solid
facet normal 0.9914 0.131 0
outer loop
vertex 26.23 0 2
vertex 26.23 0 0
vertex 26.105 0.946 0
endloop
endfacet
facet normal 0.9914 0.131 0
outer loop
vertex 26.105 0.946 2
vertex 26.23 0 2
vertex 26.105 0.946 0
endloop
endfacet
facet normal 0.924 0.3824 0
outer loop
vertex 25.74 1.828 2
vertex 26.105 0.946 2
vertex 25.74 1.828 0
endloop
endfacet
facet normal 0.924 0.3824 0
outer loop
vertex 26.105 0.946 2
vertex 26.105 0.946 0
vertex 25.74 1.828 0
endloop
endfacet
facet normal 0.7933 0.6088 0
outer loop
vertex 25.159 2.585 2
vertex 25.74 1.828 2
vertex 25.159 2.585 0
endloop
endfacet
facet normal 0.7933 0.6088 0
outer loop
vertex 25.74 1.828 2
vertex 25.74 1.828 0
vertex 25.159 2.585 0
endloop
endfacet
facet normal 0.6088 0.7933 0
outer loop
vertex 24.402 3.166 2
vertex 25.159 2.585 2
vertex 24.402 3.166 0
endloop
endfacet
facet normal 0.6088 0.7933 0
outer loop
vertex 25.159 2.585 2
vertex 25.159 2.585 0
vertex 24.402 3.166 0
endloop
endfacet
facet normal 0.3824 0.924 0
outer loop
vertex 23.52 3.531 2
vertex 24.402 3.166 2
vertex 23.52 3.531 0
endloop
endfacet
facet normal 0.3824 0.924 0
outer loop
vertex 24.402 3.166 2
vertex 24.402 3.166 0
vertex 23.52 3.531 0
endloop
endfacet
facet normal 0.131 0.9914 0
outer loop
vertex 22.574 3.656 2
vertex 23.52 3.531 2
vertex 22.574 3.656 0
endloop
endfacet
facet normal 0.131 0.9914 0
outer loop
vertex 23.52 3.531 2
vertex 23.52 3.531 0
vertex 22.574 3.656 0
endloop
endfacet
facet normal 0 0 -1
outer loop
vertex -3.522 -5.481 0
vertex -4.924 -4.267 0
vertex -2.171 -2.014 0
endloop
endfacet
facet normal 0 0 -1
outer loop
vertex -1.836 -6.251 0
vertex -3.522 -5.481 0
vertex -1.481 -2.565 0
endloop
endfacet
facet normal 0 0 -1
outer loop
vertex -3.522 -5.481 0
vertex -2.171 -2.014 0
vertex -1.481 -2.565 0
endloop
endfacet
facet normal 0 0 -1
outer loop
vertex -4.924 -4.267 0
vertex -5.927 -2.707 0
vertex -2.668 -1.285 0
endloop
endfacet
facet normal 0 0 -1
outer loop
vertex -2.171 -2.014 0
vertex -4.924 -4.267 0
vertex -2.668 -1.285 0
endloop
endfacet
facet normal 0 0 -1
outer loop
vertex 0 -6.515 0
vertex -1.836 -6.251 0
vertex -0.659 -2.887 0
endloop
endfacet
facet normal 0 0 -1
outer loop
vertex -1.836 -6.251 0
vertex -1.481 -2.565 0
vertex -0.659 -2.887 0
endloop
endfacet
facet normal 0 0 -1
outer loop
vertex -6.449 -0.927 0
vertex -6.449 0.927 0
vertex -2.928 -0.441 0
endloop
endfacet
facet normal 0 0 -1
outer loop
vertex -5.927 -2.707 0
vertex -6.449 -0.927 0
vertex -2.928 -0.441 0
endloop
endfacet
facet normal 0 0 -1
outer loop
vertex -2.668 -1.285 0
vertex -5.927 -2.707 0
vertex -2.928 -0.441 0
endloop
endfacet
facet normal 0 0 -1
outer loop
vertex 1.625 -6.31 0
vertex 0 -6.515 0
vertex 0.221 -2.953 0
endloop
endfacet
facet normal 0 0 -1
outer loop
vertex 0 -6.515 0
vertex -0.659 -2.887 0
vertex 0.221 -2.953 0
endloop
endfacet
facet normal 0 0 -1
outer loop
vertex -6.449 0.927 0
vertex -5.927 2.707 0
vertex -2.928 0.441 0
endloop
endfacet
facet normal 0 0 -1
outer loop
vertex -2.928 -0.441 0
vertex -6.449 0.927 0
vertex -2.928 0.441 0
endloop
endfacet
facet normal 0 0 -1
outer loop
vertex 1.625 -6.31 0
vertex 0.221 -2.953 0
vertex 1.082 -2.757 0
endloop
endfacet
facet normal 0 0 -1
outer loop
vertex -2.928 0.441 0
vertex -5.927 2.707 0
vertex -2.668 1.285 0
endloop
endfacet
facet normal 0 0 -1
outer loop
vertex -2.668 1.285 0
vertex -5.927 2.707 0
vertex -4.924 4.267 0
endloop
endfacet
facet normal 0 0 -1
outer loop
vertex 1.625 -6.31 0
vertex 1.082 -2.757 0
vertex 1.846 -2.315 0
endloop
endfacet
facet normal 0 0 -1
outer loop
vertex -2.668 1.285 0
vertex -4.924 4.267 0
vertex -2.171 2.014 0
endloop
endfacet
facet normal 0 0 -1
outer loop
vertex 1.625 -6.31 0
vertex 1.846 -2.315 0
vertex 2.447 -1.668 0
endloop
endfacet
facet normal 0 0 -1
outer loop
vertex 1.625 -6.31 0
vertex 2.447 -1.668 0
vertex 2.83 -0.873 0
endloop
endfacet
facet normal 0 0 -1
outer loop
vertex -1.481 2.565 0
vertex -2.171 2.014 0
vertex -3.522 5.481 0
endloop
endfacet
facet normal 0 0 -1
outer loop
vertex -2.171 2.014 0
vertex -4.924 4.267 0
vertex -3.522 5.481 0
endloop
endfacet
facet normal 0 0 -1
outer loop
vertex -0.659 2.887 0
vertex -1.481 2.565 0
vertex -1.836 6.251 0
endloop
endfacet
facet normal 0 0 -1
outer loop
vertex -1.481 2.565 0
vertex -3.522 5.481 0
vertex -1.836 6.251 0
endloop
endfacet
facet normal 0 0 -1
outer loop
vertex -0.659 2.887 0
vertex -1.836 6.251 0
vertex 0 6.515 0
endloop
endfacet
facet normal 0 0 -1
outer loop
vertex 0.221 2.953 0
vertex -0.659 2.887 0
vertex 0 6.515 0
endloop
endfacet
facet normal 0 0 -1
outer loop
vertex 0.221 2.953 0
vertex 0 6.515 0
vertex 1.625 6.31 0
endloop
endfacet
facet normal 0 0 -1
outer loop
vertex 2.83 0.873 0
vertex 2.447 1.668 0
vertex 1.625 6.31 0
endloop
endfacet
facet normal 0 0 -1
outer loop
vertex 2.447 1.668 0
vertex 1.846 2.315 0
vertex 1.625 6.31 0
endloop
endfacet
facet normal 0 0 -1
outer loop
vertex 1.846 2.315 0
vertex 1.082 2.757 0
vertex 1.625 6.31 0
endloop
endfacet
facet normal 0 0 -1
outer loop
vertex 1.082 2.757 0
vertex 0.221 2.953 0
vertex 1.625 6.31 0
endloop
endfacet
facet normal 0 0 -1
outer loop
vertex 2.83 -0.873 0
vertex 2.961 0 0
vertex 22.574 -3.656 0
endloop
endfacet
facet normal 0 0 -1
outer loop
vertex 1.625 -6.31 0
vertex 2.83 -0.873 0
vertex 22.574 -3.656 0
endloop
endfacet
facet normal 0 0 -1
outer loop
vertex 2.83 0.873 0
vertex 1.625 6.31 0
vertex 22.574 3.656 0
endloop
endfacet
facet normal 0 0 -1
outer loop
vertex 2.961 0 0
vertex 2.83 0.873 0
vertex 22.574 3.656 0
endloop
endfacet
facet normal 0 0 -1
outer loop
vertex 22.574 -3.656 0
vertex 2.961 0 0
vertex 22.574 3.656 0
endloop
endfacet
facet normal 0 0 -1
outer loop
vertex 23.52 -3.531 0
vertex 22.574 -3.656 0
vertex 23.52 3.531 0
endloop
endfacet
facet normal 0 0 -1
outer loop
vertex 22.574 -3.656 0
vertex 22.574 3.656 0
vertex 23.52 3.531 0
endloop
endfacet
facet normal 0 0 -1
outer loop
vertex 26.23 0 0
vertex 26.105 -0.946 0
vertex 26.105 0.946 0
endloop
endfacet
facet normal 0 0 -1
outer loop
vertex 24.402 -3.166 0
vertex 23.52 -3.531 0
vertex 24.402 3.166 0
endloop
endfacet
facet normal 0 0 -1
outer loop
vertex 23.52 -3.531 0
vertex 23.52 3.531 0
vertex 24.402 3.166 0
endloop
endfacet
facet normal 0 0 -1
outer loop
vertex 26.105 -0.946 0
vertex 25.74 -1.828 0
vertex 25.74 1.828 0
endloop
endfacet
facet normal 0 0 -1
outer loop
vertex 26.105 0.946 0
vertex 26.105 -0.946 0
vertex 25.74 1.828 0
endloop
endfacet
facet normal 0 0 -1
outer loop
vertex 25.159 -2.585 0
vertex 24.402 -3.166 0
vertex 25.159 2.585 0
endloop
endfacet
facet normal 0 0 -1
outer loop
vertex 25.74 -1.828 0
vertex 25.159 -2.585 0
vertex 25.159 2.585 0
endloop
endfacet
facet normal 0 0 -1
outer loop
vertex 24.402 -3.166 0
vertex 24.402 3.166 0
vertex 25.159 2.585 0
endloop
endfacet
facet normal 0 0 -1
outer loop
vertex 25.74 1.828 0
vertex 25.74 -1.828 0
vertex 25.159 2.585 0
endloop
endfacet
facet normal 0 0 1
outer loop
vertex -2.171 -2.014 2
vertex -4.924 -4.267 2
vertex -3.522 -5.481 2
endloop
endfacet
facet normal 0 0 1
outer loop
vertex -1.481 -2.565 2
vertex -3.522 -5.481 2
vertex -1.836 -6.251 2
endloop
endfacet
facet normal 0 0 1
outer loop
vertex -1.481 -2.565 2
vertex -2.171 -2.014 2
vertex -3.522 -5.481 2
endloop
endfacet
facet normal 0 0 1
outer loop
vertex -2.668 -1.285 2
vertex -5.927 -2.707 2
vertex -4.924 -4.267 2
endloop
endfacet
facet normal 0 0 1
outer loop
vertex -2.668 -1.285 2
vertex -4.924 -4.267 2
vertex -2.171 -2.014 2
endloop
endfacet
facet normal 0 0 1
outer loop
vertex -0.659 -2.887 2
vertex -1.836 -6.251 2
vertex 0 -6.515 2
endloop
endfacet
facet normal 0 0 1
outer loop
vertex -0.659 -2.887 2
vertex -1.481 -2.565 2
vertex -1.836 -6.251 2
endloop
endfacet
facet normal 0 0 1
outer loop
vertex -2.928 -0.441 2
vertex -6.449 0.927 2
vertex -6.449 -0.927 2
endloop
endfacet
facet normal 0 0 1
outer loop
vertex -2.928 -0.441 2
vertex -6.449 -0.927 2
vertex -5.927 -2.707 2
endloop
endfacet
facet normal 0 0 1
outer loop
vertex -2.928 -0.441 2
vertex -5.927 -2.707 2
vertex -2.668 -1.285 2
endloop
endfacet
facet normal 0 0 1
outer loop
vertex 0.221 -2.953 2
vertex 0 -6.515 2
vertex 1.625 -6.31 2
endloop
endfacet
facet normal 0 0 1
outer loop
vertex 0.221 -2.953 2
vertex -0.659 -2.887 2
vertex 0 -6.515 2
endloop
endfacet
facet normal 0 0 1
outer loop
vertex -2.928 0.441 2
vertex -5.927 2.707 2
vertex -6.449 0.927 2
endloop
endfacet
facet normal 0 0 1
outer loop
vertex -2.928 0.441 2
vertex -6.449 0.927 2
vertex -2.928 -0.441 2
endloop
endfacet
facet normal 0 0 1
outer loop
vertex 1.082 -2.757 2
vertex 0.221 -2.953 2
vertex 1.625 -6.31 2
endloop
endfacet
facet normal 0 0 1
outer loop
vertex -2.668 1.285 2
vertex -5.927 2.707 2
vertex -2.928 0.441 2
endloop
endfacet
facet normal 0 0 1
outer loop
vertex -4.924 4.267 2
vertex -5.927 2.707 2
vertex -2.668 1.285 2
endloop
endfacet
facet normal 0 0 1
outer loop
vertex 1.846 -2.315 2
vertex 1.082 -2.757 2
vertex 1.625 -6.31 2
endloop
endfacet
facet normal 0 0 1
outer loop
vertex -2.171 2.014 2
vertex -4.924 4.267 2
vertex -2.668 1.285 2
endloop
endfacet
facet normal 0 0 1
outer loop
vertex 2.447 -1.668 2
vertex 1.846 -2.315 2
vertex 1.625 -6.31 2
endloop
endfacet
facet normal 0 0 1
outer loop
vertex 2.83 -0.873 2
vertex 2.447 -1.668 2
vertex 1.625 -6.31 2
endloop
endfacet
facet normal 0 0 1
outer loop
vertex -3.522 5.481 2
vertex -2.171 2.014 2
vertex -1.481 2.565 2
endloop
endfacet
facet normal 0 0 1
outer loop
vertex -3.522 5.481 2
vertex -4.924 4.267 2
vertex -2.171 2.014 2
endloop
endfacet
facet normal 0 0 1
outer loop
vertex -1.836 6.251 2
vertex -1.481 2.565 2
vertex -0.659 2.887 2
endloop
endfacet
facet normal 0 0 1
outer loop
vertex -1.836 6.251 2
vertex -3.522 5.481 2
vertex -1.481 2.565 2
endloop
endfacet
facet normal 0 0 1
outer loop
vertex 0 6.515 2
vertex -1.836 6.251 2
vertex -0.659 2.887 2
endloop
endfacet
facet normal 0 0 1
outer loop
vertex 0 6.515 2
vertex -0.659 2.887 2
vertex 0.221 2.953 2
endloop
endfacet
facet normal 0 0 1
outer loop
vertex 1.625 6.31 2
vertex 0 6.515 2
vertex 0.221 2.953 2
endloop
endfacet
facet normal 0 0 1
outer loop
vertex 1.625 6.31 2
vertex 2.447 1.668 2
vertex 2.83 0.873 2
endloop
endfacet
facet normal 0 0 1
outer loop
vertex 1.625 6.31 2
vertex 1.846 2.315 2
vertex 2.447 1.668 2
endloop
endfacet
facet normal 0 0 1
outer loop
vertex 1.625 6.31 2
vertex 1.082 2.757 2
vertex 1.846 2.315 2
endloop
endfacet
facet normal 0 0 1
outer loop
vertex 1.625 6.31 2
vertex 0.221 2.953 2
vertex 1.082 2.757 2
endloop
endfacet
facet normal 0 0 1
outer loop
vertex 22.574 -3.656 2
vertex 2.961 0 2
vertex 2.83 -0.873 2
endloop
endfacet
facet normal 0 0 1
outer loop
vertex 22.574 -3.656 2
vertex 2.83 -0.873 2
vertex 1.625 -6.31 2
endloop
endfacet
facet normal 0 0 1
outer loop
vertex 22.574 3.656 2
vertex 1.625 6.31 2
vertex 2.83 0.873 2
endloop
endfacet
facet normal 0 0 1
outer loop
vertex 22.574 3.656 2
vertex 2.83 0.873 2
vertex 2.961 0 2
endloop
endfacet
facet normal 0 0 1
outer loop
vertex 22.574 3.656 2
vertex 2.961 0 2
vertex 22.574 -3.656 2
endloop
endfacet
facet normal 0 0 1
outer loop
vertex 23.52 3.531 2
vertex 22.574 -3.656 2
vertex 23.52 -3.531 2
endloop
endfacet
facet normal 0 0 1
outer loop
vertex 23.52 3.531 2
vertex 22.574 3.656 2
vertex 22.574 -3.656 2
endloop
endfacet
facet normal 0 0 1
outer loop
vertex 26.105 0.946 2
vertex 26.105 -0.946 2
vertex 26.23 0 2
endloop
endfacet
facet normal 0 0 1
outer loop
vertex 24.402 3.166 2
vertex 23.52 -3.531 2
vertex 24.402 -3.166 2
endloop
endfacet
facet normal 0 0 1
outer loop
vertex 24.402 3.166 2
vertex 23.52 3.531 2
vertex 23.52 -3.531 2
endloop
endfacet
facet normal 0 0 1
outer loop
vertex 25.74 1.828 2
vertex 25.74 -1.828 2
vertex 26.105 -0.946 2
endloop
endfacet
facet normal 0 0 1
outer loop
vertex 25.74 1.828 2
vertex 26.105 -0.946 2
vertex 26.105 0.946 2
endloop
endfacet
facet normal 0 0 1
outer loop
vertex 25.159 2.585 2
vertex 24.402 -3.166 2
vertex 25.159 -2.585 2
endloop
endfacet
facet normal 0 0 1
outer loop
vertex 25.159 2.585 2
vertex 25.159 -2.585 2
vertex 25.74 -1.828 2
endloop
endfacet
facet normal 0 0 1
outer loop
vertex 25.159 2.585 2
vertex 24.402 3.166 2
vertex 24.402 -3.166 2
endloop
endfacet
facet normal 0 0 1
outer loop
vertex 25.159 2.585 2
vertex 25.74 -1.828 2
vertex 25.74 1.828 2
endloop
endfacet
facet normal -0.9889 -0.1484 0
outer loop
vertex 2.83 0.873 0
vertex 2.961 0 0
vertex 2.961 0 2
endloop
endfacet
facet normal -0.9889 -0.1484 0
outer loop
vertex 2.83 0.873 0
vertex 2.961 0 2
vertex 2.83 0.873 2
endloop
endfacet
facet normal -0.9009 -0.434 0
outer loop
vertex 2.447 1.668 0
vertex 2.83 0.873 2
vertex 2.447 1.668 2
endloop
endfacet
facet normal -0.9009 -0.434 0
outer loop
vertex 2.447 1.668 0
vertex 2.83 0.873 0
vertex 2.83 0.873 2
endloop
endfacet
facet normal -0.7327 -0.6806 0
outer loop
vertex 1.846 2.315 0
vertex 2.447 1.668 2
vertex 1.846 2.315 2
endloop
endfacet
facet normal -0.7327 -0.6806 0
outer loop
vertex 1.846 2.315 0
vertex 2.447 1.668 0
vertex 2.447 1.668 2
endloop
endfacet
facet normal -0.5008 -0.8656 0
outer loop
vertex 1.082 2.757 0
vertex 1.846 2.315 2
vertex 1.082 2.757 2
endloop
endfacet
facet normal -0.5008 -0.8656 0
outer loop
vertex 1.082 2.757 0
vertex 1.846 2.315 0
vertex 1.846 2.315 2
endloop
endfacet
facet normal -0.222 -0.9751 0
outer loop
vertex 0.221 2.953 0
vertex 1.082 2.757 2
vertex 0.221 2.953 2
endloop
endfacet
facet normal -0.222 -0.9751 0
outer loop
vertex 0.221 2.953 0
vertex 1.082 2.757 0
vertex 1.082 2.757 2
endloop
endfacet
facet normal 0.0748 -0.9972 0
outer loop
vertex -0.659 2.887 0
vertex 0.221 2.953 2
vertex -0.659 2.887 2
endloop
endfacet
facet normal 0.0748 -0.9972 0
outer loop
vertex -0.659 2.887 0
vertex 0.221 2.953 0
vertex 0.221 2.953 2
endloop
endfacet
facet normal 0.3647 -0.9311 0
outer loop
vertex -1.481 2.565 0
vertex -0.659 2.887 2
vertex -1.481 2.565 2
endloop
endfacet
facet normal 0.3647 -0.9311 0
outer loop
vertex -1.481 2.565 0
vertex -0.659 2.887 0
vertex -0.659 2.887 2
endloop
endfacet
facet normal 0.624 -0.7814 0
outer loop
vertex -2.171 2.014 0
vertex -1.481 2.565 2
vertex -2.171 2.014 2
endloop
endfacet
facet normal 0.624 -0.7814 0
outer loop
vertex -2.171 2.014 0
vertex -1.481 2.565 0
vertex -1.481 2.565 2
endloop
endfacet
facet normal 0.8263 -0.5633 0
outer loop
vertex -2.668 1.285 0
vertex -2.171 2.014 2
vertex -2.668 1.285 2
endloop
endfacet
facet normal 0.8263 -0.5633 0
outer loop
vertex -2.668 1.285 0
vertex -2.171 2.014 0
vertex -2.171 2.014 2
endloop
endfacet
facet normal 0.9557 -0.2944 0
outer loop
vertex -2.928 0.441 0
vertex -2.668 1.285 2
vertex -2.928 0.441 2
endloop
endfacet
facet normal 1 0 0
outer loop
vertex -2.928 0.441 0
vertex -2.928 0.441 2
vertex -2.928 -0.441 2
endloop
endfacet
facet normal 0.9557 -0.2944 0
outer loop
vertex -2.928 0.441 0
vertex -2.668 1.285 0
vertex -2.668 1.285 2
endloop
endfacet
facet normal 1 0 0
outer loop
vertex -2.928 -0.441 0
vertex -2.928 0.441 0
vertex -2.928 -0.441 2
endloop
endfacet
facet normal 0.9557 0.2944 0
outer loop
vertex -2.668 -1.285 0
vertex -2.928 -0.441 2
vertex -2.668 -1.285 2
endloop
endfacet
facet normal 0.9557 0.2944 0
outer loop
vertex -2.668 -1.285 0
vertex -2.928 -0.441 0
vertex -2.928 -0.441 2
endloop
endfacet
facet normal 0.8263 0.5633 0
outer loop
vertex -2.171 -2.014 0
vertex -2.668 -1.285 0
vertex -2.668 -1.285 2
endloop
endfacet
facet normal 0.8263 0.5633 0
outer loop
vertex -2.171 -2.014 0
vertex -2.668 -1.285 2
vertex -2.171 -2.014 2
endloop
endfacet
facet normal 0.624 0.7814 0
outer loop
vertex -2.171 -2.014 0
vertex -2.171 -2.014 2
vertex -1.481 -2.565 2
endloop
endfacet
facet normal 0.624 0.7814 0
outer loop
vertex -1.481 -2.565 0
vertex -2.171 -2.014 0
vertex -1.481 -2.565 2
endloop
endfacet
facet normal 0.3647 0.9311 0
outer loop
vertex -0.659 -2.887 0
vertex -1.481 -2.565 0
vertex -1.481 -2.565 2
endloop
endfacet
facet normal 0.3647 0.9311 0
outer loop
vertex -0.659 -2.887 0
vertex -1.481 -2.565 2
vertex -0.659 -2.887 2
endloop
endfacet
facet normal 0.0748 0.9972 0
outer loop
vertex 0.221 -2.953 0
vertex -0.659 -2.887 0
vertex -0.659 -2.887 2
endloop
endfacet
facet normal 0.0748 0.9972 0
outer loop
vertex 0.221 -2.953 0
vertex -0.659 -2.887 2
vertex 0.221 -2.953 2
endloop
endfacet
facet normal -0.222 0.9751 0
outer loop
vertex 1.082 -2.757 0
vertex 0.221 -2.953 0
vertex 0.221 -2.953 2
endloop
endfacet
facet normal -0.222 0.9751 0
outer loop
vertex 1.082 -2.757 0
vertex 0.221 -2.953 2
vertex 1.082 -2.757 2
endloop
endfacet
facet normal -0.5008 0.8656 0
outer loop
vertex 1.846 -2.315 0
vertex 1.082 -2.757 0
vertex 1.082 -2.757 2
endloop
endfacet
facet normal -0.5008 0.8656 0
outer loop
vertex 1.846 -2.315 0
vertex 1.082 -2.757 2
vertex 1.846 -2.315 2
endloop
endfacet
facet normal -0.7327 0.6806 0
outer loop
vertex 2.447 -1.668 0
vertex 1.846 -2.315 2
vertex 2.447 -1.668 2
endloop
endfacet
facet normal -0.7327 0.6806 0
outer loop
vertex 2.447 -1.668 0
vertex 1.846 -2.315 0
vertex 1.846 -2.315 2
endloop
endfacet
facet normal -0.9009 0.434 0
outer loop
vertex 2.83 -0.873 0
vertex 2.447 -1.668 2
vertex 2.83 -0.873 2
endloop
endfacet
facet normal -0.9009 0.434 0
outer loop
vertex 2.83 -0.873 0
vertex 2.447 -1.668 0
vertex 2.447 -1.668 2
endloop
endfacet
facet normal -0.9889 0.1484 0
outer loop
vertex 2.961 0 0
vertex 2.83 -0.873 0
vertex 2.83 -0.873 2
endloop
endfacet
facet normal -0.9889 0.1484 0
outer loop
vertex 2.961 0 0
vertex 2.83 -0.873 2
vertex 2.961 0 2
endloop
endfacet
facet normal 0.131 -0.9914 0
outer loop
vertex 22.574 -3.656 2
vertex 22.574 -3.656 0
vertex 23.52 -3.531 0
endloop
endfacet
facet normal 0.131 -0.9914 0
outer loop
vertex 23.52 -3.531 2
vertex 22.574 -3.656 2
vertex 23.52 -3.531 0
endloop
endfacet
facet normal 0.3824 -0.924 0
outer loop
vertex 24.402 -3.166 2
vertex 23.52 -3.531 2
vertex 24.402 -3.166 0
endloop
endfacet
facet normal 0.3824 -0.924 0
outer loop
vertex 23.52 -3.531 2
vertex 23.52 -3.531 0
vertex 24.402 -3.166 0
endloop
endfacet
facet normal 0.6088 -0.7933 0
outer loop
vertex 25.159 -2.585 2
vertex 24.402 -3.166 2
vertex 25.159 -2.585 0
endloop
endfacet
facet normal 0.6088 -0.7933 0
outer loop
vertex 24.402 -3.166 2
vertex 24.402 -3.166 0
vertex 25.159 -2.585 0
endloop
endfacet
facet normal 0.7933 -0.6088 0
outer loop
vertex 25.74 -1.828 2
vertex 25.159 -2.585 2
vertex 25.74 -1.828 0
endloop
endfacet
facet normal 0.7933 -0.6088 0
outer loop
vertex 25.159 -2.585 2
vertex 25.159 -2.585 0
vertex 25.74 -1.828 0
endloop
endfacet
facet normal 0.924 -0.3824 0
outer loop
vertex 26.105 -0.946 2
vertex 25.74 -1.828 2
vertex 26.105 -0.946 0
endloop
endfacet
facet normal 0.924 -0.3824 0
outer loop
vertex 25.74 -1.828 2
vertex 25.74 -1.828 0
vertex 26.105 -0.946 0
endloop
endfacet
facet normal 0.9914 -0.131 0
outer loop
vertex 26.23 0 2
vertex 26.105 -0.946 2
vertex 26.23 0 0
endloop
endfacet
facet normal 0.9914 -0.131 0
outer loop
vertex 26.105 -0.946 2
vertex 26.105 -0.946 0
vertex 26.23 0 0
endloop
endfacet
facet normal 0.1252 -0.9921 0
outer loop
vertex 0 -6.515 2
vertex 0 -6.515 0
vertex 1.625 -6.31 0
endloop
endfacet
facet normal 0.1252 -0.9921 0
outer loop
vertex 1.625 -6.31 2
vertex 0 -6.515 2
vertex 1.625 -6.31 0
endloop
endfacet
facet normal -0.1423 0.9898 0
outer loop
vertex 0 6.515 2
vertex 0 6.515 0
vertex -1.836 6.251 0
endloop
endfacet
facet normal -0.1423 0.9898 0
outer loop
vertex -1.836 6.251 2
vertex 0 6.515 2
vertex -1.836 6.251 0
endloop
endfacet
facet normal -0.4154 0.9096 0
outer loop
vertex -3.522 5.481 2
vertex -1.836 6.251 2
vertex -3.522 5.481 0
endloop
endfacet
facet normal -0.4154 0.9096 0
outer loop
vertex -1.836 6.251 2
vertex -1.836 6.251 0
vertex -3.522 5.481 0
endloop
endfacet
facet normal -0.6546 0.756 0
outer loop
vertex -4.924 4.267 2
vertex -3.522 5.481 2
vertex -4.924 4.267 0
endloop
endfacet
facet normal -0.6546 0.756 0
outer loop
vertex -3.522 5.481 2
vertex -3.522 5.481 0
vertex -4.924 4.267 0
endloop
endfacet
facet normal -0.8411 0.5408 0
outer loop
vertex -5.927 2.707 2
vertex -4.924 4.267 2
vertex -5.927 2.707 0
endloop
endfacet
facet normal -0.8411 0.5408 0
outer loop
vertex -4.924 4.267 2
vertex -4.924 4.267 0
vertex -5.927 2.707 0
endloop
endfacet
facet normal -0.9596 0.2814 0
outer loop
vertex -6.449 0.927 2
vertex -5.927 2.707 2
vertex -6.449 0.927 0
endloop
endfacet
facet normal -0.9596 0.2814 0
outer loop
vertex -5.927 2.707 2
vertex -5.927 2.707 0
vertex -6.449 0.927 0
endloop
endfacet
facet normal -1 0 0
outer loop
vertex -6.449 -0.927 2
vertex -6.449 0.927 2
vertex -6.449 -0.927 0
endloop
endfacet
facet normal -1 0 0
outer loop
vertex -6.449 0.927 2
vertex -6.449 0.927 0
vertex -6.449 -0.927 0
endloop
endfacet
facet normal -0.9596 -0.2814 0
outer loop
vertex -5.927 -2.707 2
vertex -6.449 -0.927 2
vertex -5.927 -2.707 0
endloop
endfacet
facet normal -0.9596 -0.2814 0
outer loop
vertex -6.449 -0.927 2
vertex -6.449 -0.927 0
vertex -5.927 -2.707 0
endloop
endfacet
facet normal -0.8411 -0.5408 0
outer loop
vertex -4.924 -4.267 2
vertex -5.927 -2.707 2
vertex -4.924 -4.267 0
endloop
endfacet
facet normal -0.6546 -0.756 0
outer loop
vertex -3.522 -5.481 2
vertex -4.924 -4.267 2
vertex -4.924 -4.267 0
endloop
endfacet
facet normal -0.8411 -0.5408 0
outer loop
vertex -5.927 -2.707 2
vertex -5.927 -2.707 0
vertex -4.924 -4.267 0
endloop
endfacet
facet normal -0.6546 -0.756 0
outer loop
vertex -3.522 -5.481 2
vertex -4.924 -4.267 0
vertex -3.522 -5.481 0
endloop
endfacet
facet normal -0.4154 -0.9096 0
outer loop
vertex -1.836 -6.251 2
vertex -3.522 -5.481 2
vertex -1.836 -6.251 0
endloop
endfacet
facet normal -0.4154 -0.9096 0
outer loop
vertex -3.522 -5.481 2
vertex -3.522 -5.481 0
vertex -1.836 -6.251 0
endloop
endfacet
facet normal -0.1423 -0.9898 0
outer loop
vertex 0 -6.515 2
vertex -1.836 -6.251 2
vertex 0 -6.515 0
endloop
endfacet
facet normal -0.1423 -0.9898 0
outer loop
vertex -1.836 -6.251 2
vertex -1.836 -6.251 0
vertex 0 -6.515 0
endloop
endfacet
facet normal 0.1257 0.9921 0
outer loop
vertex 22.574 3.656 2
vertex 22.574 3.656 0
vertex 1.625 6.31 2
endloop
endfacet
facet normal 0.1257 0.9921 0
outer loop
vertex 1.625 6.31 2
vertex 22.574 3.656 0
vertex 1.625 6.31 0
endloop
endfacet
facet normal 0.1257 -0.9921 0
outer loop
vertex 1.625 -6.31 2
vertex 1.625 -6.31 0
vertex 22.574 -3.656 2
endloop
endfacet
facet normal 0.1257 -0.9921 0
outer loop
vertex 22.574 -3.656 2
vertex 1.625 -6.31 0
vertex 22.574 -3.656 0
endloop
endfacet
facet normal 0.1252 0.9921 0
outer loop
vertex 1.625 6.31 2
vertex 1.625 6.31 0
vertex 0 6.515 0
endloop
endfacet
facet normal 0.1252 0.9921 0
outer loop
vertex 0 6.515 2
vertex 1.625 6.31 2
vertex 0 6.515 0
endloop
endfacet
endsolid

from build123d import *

# Parameters (mm, degrees)
F0_R     = 2.9612883312
F1_DEPTH = 2
F2_R     = 0.988841467
F3_DEPTH = 10


with BuildPart() as f1:
    # F0 (on Top) → F1 (new body)
    with BuildSketch(Plane.XY):
        with BuildLine():
            Line((1.6245851515, 6.3095047445), (0, 6.5152994586))
            ThreePointArc((0, 6.5152994586), (-6.5152994586, 0), (0, -6.5152994586))
            Line((0, -6.5152994586), (1.6245851515, -6.3095047445))
            ThreePointArc((1.6245851515, -6.3095047445), (5.1494555923, -3.9915202792), (6.5152994586, 0))
            ThreePointArc((6.5152994586, 0), (5.1494555923, 3.9915202792), (1.6245851515, 6.3095047445))
        make_face()
        Circle(F0_R, mode=Mode.SUBTRACT)
        with BuildLine():
            Line((22.574134171, 3.6557155928), (1.6245851515, 6.3095047445))
            ThreePointArc((1.6245851515, 6.3095047445), (5.1494555923, 3.9915202792), (6.5152994586, 0))
            ThreePointArc((6.5152994586, 0), (5.1494555923, -3.9915202792), (1.6245851515, -6.3095047445))
            Line((1.6245851515, -6.3095047445), (22.574134171, -3.6557155928))
            ThreePointArc((22.574134171, -3.6557155928), (18.9184185782, 0), (22.574134171, 3.6557155928))
        make_face()
        with BuildLine():
            ThreePointArc((26.2298497639, 0), (25.1591154568, 2.5849812858), (22.574134171, 3.6557155928))
            ThreePointArc((22.574134171, 3.6557155928), (18.9184185782, 0), (22.574134171, -3.6557155928))
            ThreePointArc((22.574134171, -3.6557155928), (25.1591154568, -2.5849812858), (26.2298497639, 0))
        make_face()
    extrude(amount=F1_DEPTH)

    # F2 (on face) → F3 (cut)
    with BuildSketch(Plane.XY.offset(2)):
        with Locations((22.574134171, 0)):
            Circle(F2_R)
    extrude(amount=F3_DEPTH, mode=Mode.SUBTRACT)


solid = f1.part
